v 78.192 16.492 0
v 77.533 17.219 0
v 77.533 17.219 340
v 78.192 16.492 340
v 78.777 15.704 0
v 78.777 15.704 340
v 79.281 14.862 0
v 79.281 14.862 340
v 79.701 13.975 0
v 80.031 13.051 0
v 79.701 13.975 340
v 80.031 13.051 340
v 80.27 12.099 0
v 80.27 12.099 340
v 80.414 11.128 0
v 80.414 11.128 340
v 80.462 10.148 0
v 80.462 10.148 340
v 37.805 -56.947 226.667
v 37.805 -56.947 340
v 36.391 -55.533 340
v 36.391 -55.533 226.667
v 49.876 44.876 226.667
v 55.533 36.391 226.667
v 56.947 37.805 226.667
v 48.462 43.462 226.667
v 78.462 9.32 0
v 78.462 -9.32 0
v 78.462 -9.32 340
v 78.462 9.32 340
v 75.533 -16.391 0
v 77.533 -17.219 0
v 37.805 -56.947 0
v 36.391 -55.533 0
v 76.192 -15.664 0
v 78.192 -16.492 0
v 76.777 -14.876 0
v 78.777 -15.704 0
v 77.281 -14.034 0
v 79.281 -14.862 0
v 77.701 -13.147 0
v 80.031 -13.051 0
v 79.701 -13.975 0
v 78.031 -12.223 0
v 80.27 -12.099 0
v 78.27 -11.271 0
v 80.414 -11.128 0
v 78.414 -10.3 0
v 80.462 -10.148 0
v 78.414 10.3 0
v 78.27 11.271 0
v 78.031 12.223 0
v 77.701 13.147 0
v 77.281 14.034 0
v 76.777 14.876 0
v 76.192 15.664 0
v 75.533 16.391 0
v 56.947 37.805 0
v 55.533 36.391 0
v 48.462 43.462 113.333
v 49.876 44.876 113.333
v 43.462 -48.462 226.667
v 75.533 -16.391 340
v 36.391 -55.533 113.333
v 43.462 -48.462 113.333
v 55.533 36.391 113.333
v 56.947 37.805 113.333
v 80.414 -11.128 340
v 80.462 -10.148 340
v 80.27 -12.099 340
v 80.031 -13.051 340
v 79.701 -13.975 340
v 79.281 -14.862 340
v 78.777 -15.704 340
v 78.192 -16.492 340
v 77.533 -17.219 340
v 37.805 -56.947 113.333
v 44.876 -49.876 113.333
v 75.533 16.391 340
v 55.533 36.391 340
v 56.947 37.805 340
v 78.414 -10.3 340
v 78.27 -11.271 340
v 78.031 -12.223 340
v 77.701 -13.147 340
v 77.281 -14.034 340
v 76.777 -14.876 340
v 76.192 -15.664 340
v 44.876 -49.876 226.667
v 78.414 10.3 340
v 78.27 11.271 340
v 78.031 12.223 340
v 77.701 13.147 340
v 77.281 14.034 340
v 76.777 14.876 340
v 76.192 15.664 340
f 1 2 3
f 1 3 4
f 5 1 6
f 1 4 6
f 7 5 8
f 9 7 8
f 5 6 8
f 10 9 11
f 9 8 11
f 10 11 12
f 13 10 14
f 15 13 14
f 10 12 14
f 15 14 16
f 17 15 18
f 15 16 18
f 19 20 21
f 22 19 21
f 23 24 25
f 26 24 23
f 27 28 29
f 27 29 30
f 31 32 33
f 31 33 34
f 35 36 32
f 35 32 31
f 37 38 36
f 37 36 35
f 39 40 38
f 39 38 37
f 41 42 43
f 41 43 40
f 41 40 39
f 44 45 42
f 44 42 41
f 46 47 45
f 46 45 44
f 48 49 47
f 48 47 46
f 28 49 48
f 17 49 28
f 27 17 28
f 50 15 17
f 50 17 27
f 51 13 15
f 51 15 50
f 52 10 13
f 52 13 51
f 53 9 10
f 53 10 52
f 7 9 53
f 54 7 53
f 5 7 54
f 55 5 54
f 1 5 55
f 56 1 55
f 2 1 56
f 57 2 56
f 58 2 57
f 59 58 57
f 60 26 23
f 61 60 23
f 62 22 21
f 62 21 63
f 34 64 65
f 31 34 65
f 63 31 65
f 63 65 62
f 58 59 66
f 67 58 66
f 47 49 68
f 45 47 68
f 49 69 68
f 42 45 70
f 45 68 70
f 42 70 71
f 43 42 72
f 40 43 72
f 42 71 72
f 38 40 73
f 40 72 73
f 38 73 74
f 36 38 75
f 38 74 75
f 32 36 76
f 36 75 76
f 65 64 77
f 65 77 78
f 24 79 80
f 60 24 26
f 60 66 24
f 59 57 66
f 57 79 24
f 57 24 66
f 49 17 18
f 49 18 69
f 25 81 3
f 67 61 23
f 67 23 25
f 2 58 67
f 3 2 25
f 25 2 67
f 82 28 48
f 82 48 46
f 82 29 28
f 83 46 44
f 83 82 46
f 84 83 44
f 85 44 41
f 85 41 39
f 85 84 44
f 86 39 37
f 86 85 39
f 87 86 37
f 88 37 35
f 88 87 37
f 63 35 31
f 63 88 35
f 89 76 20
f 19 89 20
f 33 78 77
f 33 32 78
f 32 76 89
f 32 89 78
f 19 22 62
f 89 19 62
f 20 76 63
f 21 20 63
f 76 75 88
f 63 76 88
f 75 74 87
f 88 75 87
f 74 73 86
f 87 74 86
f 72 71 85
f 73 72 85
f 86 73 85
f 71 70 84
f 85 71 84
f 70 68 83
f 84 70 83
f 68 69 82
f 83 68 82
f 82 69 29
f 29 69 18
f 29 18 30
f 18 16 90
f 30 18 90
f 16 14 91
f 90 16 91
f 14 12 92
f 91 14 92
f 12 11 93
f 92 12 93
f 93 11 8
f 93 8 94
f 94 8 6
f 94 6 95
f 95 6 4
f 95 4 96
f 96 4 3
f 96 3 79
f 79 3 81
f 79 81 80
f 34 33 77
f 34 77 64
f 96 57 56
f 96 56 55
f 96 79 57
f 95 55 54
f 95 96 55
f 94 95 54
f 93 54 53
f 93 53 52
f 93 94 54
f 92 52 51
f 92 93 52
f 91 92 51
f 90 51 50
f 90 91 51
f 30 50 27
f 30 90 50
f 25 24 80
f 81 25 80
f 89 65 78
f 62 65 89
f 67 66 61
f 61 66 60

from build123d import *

# Parameters (mm, degrees)
BOSS_EXTRUDE1_DEPTH = 340
SKETCH4_W           = 113.333333333
SKETCH4_H           = 10
CUT_EXTRUDE3_DEPTH  = 24.627416998
SKETCH5_W           = 113.333333334
SKETCH5_H           = 10
CUT_EXTRUDE4_DEPTH  = 33.162950904
FILLET2_R           = 10


with BuildPart() as part:
    # Sketch1 → Boss-Extrude1 (new body)
    with BuildSketch(Plane.XY):
        Polygon((48.461940777, 43.461940777), (49.876154339, 44.876154339), (80.461940777, 14.290367902), (80.461940777, -14.290367902), (37.805086528, -56.947222151), (36.390872965, -55.533008589), (78.461940777, -13.461940777), (78.461940777, 13.461940777), align=None)
    extrude(amount=BOSS_EXTRUDE1_DEPTH)

    # Sketch4 → Cut-Extrude3 (cut, through all)
    with BuildSketch(Plane(origin=(45.961940777, 45.961940777, 0), x_dir=(0, 0, 1), z_dir=(-0.707106781, -0.707106781, 0))):
        with Locations((56.666666667, -8.535533906)):
            Rectangle(SKETCH4_W, SKETCH4_H)
        with Locations((283.333333334, -8.535533906)):
            Rectangle(SKETCH4_W, SKETCH4_H)
    extrude(amount=-CUT_EXTRUDE3_DEPTH, mode=Mode.SUBTRACT)

    # Sketch5 → Cut-Extrude4 (cut, through all)
    with BuildSketch(Plane(origin=(45.961940777, -45.961940777, 0), x_dir=(0, 0, 1), z_dir=(-0.707106781, 0.707106781, 0))):
        with Locations((170, -8.535533906)):
            Rectangle(SKETCH5_W, SKETCH5_H)
    extrude(amount=-CUT_EXTRUDE4_DEPTH, mode=Mode.SUBTRACT)

    # Fillet2
    fillet2_edges = [part.edges().sort_by_distance(p)[0] for p in [
        (80.461940777, 14.290367902, 170),
        (80.461940777, -14.290367902, 170),
        (78.461940777, -13.461940777, 170),
        (78.461940777, 13.461940777, 170),
    ]]
    fillet(fillet2_edges, radius=FILLET2_R)


solid = part.part
